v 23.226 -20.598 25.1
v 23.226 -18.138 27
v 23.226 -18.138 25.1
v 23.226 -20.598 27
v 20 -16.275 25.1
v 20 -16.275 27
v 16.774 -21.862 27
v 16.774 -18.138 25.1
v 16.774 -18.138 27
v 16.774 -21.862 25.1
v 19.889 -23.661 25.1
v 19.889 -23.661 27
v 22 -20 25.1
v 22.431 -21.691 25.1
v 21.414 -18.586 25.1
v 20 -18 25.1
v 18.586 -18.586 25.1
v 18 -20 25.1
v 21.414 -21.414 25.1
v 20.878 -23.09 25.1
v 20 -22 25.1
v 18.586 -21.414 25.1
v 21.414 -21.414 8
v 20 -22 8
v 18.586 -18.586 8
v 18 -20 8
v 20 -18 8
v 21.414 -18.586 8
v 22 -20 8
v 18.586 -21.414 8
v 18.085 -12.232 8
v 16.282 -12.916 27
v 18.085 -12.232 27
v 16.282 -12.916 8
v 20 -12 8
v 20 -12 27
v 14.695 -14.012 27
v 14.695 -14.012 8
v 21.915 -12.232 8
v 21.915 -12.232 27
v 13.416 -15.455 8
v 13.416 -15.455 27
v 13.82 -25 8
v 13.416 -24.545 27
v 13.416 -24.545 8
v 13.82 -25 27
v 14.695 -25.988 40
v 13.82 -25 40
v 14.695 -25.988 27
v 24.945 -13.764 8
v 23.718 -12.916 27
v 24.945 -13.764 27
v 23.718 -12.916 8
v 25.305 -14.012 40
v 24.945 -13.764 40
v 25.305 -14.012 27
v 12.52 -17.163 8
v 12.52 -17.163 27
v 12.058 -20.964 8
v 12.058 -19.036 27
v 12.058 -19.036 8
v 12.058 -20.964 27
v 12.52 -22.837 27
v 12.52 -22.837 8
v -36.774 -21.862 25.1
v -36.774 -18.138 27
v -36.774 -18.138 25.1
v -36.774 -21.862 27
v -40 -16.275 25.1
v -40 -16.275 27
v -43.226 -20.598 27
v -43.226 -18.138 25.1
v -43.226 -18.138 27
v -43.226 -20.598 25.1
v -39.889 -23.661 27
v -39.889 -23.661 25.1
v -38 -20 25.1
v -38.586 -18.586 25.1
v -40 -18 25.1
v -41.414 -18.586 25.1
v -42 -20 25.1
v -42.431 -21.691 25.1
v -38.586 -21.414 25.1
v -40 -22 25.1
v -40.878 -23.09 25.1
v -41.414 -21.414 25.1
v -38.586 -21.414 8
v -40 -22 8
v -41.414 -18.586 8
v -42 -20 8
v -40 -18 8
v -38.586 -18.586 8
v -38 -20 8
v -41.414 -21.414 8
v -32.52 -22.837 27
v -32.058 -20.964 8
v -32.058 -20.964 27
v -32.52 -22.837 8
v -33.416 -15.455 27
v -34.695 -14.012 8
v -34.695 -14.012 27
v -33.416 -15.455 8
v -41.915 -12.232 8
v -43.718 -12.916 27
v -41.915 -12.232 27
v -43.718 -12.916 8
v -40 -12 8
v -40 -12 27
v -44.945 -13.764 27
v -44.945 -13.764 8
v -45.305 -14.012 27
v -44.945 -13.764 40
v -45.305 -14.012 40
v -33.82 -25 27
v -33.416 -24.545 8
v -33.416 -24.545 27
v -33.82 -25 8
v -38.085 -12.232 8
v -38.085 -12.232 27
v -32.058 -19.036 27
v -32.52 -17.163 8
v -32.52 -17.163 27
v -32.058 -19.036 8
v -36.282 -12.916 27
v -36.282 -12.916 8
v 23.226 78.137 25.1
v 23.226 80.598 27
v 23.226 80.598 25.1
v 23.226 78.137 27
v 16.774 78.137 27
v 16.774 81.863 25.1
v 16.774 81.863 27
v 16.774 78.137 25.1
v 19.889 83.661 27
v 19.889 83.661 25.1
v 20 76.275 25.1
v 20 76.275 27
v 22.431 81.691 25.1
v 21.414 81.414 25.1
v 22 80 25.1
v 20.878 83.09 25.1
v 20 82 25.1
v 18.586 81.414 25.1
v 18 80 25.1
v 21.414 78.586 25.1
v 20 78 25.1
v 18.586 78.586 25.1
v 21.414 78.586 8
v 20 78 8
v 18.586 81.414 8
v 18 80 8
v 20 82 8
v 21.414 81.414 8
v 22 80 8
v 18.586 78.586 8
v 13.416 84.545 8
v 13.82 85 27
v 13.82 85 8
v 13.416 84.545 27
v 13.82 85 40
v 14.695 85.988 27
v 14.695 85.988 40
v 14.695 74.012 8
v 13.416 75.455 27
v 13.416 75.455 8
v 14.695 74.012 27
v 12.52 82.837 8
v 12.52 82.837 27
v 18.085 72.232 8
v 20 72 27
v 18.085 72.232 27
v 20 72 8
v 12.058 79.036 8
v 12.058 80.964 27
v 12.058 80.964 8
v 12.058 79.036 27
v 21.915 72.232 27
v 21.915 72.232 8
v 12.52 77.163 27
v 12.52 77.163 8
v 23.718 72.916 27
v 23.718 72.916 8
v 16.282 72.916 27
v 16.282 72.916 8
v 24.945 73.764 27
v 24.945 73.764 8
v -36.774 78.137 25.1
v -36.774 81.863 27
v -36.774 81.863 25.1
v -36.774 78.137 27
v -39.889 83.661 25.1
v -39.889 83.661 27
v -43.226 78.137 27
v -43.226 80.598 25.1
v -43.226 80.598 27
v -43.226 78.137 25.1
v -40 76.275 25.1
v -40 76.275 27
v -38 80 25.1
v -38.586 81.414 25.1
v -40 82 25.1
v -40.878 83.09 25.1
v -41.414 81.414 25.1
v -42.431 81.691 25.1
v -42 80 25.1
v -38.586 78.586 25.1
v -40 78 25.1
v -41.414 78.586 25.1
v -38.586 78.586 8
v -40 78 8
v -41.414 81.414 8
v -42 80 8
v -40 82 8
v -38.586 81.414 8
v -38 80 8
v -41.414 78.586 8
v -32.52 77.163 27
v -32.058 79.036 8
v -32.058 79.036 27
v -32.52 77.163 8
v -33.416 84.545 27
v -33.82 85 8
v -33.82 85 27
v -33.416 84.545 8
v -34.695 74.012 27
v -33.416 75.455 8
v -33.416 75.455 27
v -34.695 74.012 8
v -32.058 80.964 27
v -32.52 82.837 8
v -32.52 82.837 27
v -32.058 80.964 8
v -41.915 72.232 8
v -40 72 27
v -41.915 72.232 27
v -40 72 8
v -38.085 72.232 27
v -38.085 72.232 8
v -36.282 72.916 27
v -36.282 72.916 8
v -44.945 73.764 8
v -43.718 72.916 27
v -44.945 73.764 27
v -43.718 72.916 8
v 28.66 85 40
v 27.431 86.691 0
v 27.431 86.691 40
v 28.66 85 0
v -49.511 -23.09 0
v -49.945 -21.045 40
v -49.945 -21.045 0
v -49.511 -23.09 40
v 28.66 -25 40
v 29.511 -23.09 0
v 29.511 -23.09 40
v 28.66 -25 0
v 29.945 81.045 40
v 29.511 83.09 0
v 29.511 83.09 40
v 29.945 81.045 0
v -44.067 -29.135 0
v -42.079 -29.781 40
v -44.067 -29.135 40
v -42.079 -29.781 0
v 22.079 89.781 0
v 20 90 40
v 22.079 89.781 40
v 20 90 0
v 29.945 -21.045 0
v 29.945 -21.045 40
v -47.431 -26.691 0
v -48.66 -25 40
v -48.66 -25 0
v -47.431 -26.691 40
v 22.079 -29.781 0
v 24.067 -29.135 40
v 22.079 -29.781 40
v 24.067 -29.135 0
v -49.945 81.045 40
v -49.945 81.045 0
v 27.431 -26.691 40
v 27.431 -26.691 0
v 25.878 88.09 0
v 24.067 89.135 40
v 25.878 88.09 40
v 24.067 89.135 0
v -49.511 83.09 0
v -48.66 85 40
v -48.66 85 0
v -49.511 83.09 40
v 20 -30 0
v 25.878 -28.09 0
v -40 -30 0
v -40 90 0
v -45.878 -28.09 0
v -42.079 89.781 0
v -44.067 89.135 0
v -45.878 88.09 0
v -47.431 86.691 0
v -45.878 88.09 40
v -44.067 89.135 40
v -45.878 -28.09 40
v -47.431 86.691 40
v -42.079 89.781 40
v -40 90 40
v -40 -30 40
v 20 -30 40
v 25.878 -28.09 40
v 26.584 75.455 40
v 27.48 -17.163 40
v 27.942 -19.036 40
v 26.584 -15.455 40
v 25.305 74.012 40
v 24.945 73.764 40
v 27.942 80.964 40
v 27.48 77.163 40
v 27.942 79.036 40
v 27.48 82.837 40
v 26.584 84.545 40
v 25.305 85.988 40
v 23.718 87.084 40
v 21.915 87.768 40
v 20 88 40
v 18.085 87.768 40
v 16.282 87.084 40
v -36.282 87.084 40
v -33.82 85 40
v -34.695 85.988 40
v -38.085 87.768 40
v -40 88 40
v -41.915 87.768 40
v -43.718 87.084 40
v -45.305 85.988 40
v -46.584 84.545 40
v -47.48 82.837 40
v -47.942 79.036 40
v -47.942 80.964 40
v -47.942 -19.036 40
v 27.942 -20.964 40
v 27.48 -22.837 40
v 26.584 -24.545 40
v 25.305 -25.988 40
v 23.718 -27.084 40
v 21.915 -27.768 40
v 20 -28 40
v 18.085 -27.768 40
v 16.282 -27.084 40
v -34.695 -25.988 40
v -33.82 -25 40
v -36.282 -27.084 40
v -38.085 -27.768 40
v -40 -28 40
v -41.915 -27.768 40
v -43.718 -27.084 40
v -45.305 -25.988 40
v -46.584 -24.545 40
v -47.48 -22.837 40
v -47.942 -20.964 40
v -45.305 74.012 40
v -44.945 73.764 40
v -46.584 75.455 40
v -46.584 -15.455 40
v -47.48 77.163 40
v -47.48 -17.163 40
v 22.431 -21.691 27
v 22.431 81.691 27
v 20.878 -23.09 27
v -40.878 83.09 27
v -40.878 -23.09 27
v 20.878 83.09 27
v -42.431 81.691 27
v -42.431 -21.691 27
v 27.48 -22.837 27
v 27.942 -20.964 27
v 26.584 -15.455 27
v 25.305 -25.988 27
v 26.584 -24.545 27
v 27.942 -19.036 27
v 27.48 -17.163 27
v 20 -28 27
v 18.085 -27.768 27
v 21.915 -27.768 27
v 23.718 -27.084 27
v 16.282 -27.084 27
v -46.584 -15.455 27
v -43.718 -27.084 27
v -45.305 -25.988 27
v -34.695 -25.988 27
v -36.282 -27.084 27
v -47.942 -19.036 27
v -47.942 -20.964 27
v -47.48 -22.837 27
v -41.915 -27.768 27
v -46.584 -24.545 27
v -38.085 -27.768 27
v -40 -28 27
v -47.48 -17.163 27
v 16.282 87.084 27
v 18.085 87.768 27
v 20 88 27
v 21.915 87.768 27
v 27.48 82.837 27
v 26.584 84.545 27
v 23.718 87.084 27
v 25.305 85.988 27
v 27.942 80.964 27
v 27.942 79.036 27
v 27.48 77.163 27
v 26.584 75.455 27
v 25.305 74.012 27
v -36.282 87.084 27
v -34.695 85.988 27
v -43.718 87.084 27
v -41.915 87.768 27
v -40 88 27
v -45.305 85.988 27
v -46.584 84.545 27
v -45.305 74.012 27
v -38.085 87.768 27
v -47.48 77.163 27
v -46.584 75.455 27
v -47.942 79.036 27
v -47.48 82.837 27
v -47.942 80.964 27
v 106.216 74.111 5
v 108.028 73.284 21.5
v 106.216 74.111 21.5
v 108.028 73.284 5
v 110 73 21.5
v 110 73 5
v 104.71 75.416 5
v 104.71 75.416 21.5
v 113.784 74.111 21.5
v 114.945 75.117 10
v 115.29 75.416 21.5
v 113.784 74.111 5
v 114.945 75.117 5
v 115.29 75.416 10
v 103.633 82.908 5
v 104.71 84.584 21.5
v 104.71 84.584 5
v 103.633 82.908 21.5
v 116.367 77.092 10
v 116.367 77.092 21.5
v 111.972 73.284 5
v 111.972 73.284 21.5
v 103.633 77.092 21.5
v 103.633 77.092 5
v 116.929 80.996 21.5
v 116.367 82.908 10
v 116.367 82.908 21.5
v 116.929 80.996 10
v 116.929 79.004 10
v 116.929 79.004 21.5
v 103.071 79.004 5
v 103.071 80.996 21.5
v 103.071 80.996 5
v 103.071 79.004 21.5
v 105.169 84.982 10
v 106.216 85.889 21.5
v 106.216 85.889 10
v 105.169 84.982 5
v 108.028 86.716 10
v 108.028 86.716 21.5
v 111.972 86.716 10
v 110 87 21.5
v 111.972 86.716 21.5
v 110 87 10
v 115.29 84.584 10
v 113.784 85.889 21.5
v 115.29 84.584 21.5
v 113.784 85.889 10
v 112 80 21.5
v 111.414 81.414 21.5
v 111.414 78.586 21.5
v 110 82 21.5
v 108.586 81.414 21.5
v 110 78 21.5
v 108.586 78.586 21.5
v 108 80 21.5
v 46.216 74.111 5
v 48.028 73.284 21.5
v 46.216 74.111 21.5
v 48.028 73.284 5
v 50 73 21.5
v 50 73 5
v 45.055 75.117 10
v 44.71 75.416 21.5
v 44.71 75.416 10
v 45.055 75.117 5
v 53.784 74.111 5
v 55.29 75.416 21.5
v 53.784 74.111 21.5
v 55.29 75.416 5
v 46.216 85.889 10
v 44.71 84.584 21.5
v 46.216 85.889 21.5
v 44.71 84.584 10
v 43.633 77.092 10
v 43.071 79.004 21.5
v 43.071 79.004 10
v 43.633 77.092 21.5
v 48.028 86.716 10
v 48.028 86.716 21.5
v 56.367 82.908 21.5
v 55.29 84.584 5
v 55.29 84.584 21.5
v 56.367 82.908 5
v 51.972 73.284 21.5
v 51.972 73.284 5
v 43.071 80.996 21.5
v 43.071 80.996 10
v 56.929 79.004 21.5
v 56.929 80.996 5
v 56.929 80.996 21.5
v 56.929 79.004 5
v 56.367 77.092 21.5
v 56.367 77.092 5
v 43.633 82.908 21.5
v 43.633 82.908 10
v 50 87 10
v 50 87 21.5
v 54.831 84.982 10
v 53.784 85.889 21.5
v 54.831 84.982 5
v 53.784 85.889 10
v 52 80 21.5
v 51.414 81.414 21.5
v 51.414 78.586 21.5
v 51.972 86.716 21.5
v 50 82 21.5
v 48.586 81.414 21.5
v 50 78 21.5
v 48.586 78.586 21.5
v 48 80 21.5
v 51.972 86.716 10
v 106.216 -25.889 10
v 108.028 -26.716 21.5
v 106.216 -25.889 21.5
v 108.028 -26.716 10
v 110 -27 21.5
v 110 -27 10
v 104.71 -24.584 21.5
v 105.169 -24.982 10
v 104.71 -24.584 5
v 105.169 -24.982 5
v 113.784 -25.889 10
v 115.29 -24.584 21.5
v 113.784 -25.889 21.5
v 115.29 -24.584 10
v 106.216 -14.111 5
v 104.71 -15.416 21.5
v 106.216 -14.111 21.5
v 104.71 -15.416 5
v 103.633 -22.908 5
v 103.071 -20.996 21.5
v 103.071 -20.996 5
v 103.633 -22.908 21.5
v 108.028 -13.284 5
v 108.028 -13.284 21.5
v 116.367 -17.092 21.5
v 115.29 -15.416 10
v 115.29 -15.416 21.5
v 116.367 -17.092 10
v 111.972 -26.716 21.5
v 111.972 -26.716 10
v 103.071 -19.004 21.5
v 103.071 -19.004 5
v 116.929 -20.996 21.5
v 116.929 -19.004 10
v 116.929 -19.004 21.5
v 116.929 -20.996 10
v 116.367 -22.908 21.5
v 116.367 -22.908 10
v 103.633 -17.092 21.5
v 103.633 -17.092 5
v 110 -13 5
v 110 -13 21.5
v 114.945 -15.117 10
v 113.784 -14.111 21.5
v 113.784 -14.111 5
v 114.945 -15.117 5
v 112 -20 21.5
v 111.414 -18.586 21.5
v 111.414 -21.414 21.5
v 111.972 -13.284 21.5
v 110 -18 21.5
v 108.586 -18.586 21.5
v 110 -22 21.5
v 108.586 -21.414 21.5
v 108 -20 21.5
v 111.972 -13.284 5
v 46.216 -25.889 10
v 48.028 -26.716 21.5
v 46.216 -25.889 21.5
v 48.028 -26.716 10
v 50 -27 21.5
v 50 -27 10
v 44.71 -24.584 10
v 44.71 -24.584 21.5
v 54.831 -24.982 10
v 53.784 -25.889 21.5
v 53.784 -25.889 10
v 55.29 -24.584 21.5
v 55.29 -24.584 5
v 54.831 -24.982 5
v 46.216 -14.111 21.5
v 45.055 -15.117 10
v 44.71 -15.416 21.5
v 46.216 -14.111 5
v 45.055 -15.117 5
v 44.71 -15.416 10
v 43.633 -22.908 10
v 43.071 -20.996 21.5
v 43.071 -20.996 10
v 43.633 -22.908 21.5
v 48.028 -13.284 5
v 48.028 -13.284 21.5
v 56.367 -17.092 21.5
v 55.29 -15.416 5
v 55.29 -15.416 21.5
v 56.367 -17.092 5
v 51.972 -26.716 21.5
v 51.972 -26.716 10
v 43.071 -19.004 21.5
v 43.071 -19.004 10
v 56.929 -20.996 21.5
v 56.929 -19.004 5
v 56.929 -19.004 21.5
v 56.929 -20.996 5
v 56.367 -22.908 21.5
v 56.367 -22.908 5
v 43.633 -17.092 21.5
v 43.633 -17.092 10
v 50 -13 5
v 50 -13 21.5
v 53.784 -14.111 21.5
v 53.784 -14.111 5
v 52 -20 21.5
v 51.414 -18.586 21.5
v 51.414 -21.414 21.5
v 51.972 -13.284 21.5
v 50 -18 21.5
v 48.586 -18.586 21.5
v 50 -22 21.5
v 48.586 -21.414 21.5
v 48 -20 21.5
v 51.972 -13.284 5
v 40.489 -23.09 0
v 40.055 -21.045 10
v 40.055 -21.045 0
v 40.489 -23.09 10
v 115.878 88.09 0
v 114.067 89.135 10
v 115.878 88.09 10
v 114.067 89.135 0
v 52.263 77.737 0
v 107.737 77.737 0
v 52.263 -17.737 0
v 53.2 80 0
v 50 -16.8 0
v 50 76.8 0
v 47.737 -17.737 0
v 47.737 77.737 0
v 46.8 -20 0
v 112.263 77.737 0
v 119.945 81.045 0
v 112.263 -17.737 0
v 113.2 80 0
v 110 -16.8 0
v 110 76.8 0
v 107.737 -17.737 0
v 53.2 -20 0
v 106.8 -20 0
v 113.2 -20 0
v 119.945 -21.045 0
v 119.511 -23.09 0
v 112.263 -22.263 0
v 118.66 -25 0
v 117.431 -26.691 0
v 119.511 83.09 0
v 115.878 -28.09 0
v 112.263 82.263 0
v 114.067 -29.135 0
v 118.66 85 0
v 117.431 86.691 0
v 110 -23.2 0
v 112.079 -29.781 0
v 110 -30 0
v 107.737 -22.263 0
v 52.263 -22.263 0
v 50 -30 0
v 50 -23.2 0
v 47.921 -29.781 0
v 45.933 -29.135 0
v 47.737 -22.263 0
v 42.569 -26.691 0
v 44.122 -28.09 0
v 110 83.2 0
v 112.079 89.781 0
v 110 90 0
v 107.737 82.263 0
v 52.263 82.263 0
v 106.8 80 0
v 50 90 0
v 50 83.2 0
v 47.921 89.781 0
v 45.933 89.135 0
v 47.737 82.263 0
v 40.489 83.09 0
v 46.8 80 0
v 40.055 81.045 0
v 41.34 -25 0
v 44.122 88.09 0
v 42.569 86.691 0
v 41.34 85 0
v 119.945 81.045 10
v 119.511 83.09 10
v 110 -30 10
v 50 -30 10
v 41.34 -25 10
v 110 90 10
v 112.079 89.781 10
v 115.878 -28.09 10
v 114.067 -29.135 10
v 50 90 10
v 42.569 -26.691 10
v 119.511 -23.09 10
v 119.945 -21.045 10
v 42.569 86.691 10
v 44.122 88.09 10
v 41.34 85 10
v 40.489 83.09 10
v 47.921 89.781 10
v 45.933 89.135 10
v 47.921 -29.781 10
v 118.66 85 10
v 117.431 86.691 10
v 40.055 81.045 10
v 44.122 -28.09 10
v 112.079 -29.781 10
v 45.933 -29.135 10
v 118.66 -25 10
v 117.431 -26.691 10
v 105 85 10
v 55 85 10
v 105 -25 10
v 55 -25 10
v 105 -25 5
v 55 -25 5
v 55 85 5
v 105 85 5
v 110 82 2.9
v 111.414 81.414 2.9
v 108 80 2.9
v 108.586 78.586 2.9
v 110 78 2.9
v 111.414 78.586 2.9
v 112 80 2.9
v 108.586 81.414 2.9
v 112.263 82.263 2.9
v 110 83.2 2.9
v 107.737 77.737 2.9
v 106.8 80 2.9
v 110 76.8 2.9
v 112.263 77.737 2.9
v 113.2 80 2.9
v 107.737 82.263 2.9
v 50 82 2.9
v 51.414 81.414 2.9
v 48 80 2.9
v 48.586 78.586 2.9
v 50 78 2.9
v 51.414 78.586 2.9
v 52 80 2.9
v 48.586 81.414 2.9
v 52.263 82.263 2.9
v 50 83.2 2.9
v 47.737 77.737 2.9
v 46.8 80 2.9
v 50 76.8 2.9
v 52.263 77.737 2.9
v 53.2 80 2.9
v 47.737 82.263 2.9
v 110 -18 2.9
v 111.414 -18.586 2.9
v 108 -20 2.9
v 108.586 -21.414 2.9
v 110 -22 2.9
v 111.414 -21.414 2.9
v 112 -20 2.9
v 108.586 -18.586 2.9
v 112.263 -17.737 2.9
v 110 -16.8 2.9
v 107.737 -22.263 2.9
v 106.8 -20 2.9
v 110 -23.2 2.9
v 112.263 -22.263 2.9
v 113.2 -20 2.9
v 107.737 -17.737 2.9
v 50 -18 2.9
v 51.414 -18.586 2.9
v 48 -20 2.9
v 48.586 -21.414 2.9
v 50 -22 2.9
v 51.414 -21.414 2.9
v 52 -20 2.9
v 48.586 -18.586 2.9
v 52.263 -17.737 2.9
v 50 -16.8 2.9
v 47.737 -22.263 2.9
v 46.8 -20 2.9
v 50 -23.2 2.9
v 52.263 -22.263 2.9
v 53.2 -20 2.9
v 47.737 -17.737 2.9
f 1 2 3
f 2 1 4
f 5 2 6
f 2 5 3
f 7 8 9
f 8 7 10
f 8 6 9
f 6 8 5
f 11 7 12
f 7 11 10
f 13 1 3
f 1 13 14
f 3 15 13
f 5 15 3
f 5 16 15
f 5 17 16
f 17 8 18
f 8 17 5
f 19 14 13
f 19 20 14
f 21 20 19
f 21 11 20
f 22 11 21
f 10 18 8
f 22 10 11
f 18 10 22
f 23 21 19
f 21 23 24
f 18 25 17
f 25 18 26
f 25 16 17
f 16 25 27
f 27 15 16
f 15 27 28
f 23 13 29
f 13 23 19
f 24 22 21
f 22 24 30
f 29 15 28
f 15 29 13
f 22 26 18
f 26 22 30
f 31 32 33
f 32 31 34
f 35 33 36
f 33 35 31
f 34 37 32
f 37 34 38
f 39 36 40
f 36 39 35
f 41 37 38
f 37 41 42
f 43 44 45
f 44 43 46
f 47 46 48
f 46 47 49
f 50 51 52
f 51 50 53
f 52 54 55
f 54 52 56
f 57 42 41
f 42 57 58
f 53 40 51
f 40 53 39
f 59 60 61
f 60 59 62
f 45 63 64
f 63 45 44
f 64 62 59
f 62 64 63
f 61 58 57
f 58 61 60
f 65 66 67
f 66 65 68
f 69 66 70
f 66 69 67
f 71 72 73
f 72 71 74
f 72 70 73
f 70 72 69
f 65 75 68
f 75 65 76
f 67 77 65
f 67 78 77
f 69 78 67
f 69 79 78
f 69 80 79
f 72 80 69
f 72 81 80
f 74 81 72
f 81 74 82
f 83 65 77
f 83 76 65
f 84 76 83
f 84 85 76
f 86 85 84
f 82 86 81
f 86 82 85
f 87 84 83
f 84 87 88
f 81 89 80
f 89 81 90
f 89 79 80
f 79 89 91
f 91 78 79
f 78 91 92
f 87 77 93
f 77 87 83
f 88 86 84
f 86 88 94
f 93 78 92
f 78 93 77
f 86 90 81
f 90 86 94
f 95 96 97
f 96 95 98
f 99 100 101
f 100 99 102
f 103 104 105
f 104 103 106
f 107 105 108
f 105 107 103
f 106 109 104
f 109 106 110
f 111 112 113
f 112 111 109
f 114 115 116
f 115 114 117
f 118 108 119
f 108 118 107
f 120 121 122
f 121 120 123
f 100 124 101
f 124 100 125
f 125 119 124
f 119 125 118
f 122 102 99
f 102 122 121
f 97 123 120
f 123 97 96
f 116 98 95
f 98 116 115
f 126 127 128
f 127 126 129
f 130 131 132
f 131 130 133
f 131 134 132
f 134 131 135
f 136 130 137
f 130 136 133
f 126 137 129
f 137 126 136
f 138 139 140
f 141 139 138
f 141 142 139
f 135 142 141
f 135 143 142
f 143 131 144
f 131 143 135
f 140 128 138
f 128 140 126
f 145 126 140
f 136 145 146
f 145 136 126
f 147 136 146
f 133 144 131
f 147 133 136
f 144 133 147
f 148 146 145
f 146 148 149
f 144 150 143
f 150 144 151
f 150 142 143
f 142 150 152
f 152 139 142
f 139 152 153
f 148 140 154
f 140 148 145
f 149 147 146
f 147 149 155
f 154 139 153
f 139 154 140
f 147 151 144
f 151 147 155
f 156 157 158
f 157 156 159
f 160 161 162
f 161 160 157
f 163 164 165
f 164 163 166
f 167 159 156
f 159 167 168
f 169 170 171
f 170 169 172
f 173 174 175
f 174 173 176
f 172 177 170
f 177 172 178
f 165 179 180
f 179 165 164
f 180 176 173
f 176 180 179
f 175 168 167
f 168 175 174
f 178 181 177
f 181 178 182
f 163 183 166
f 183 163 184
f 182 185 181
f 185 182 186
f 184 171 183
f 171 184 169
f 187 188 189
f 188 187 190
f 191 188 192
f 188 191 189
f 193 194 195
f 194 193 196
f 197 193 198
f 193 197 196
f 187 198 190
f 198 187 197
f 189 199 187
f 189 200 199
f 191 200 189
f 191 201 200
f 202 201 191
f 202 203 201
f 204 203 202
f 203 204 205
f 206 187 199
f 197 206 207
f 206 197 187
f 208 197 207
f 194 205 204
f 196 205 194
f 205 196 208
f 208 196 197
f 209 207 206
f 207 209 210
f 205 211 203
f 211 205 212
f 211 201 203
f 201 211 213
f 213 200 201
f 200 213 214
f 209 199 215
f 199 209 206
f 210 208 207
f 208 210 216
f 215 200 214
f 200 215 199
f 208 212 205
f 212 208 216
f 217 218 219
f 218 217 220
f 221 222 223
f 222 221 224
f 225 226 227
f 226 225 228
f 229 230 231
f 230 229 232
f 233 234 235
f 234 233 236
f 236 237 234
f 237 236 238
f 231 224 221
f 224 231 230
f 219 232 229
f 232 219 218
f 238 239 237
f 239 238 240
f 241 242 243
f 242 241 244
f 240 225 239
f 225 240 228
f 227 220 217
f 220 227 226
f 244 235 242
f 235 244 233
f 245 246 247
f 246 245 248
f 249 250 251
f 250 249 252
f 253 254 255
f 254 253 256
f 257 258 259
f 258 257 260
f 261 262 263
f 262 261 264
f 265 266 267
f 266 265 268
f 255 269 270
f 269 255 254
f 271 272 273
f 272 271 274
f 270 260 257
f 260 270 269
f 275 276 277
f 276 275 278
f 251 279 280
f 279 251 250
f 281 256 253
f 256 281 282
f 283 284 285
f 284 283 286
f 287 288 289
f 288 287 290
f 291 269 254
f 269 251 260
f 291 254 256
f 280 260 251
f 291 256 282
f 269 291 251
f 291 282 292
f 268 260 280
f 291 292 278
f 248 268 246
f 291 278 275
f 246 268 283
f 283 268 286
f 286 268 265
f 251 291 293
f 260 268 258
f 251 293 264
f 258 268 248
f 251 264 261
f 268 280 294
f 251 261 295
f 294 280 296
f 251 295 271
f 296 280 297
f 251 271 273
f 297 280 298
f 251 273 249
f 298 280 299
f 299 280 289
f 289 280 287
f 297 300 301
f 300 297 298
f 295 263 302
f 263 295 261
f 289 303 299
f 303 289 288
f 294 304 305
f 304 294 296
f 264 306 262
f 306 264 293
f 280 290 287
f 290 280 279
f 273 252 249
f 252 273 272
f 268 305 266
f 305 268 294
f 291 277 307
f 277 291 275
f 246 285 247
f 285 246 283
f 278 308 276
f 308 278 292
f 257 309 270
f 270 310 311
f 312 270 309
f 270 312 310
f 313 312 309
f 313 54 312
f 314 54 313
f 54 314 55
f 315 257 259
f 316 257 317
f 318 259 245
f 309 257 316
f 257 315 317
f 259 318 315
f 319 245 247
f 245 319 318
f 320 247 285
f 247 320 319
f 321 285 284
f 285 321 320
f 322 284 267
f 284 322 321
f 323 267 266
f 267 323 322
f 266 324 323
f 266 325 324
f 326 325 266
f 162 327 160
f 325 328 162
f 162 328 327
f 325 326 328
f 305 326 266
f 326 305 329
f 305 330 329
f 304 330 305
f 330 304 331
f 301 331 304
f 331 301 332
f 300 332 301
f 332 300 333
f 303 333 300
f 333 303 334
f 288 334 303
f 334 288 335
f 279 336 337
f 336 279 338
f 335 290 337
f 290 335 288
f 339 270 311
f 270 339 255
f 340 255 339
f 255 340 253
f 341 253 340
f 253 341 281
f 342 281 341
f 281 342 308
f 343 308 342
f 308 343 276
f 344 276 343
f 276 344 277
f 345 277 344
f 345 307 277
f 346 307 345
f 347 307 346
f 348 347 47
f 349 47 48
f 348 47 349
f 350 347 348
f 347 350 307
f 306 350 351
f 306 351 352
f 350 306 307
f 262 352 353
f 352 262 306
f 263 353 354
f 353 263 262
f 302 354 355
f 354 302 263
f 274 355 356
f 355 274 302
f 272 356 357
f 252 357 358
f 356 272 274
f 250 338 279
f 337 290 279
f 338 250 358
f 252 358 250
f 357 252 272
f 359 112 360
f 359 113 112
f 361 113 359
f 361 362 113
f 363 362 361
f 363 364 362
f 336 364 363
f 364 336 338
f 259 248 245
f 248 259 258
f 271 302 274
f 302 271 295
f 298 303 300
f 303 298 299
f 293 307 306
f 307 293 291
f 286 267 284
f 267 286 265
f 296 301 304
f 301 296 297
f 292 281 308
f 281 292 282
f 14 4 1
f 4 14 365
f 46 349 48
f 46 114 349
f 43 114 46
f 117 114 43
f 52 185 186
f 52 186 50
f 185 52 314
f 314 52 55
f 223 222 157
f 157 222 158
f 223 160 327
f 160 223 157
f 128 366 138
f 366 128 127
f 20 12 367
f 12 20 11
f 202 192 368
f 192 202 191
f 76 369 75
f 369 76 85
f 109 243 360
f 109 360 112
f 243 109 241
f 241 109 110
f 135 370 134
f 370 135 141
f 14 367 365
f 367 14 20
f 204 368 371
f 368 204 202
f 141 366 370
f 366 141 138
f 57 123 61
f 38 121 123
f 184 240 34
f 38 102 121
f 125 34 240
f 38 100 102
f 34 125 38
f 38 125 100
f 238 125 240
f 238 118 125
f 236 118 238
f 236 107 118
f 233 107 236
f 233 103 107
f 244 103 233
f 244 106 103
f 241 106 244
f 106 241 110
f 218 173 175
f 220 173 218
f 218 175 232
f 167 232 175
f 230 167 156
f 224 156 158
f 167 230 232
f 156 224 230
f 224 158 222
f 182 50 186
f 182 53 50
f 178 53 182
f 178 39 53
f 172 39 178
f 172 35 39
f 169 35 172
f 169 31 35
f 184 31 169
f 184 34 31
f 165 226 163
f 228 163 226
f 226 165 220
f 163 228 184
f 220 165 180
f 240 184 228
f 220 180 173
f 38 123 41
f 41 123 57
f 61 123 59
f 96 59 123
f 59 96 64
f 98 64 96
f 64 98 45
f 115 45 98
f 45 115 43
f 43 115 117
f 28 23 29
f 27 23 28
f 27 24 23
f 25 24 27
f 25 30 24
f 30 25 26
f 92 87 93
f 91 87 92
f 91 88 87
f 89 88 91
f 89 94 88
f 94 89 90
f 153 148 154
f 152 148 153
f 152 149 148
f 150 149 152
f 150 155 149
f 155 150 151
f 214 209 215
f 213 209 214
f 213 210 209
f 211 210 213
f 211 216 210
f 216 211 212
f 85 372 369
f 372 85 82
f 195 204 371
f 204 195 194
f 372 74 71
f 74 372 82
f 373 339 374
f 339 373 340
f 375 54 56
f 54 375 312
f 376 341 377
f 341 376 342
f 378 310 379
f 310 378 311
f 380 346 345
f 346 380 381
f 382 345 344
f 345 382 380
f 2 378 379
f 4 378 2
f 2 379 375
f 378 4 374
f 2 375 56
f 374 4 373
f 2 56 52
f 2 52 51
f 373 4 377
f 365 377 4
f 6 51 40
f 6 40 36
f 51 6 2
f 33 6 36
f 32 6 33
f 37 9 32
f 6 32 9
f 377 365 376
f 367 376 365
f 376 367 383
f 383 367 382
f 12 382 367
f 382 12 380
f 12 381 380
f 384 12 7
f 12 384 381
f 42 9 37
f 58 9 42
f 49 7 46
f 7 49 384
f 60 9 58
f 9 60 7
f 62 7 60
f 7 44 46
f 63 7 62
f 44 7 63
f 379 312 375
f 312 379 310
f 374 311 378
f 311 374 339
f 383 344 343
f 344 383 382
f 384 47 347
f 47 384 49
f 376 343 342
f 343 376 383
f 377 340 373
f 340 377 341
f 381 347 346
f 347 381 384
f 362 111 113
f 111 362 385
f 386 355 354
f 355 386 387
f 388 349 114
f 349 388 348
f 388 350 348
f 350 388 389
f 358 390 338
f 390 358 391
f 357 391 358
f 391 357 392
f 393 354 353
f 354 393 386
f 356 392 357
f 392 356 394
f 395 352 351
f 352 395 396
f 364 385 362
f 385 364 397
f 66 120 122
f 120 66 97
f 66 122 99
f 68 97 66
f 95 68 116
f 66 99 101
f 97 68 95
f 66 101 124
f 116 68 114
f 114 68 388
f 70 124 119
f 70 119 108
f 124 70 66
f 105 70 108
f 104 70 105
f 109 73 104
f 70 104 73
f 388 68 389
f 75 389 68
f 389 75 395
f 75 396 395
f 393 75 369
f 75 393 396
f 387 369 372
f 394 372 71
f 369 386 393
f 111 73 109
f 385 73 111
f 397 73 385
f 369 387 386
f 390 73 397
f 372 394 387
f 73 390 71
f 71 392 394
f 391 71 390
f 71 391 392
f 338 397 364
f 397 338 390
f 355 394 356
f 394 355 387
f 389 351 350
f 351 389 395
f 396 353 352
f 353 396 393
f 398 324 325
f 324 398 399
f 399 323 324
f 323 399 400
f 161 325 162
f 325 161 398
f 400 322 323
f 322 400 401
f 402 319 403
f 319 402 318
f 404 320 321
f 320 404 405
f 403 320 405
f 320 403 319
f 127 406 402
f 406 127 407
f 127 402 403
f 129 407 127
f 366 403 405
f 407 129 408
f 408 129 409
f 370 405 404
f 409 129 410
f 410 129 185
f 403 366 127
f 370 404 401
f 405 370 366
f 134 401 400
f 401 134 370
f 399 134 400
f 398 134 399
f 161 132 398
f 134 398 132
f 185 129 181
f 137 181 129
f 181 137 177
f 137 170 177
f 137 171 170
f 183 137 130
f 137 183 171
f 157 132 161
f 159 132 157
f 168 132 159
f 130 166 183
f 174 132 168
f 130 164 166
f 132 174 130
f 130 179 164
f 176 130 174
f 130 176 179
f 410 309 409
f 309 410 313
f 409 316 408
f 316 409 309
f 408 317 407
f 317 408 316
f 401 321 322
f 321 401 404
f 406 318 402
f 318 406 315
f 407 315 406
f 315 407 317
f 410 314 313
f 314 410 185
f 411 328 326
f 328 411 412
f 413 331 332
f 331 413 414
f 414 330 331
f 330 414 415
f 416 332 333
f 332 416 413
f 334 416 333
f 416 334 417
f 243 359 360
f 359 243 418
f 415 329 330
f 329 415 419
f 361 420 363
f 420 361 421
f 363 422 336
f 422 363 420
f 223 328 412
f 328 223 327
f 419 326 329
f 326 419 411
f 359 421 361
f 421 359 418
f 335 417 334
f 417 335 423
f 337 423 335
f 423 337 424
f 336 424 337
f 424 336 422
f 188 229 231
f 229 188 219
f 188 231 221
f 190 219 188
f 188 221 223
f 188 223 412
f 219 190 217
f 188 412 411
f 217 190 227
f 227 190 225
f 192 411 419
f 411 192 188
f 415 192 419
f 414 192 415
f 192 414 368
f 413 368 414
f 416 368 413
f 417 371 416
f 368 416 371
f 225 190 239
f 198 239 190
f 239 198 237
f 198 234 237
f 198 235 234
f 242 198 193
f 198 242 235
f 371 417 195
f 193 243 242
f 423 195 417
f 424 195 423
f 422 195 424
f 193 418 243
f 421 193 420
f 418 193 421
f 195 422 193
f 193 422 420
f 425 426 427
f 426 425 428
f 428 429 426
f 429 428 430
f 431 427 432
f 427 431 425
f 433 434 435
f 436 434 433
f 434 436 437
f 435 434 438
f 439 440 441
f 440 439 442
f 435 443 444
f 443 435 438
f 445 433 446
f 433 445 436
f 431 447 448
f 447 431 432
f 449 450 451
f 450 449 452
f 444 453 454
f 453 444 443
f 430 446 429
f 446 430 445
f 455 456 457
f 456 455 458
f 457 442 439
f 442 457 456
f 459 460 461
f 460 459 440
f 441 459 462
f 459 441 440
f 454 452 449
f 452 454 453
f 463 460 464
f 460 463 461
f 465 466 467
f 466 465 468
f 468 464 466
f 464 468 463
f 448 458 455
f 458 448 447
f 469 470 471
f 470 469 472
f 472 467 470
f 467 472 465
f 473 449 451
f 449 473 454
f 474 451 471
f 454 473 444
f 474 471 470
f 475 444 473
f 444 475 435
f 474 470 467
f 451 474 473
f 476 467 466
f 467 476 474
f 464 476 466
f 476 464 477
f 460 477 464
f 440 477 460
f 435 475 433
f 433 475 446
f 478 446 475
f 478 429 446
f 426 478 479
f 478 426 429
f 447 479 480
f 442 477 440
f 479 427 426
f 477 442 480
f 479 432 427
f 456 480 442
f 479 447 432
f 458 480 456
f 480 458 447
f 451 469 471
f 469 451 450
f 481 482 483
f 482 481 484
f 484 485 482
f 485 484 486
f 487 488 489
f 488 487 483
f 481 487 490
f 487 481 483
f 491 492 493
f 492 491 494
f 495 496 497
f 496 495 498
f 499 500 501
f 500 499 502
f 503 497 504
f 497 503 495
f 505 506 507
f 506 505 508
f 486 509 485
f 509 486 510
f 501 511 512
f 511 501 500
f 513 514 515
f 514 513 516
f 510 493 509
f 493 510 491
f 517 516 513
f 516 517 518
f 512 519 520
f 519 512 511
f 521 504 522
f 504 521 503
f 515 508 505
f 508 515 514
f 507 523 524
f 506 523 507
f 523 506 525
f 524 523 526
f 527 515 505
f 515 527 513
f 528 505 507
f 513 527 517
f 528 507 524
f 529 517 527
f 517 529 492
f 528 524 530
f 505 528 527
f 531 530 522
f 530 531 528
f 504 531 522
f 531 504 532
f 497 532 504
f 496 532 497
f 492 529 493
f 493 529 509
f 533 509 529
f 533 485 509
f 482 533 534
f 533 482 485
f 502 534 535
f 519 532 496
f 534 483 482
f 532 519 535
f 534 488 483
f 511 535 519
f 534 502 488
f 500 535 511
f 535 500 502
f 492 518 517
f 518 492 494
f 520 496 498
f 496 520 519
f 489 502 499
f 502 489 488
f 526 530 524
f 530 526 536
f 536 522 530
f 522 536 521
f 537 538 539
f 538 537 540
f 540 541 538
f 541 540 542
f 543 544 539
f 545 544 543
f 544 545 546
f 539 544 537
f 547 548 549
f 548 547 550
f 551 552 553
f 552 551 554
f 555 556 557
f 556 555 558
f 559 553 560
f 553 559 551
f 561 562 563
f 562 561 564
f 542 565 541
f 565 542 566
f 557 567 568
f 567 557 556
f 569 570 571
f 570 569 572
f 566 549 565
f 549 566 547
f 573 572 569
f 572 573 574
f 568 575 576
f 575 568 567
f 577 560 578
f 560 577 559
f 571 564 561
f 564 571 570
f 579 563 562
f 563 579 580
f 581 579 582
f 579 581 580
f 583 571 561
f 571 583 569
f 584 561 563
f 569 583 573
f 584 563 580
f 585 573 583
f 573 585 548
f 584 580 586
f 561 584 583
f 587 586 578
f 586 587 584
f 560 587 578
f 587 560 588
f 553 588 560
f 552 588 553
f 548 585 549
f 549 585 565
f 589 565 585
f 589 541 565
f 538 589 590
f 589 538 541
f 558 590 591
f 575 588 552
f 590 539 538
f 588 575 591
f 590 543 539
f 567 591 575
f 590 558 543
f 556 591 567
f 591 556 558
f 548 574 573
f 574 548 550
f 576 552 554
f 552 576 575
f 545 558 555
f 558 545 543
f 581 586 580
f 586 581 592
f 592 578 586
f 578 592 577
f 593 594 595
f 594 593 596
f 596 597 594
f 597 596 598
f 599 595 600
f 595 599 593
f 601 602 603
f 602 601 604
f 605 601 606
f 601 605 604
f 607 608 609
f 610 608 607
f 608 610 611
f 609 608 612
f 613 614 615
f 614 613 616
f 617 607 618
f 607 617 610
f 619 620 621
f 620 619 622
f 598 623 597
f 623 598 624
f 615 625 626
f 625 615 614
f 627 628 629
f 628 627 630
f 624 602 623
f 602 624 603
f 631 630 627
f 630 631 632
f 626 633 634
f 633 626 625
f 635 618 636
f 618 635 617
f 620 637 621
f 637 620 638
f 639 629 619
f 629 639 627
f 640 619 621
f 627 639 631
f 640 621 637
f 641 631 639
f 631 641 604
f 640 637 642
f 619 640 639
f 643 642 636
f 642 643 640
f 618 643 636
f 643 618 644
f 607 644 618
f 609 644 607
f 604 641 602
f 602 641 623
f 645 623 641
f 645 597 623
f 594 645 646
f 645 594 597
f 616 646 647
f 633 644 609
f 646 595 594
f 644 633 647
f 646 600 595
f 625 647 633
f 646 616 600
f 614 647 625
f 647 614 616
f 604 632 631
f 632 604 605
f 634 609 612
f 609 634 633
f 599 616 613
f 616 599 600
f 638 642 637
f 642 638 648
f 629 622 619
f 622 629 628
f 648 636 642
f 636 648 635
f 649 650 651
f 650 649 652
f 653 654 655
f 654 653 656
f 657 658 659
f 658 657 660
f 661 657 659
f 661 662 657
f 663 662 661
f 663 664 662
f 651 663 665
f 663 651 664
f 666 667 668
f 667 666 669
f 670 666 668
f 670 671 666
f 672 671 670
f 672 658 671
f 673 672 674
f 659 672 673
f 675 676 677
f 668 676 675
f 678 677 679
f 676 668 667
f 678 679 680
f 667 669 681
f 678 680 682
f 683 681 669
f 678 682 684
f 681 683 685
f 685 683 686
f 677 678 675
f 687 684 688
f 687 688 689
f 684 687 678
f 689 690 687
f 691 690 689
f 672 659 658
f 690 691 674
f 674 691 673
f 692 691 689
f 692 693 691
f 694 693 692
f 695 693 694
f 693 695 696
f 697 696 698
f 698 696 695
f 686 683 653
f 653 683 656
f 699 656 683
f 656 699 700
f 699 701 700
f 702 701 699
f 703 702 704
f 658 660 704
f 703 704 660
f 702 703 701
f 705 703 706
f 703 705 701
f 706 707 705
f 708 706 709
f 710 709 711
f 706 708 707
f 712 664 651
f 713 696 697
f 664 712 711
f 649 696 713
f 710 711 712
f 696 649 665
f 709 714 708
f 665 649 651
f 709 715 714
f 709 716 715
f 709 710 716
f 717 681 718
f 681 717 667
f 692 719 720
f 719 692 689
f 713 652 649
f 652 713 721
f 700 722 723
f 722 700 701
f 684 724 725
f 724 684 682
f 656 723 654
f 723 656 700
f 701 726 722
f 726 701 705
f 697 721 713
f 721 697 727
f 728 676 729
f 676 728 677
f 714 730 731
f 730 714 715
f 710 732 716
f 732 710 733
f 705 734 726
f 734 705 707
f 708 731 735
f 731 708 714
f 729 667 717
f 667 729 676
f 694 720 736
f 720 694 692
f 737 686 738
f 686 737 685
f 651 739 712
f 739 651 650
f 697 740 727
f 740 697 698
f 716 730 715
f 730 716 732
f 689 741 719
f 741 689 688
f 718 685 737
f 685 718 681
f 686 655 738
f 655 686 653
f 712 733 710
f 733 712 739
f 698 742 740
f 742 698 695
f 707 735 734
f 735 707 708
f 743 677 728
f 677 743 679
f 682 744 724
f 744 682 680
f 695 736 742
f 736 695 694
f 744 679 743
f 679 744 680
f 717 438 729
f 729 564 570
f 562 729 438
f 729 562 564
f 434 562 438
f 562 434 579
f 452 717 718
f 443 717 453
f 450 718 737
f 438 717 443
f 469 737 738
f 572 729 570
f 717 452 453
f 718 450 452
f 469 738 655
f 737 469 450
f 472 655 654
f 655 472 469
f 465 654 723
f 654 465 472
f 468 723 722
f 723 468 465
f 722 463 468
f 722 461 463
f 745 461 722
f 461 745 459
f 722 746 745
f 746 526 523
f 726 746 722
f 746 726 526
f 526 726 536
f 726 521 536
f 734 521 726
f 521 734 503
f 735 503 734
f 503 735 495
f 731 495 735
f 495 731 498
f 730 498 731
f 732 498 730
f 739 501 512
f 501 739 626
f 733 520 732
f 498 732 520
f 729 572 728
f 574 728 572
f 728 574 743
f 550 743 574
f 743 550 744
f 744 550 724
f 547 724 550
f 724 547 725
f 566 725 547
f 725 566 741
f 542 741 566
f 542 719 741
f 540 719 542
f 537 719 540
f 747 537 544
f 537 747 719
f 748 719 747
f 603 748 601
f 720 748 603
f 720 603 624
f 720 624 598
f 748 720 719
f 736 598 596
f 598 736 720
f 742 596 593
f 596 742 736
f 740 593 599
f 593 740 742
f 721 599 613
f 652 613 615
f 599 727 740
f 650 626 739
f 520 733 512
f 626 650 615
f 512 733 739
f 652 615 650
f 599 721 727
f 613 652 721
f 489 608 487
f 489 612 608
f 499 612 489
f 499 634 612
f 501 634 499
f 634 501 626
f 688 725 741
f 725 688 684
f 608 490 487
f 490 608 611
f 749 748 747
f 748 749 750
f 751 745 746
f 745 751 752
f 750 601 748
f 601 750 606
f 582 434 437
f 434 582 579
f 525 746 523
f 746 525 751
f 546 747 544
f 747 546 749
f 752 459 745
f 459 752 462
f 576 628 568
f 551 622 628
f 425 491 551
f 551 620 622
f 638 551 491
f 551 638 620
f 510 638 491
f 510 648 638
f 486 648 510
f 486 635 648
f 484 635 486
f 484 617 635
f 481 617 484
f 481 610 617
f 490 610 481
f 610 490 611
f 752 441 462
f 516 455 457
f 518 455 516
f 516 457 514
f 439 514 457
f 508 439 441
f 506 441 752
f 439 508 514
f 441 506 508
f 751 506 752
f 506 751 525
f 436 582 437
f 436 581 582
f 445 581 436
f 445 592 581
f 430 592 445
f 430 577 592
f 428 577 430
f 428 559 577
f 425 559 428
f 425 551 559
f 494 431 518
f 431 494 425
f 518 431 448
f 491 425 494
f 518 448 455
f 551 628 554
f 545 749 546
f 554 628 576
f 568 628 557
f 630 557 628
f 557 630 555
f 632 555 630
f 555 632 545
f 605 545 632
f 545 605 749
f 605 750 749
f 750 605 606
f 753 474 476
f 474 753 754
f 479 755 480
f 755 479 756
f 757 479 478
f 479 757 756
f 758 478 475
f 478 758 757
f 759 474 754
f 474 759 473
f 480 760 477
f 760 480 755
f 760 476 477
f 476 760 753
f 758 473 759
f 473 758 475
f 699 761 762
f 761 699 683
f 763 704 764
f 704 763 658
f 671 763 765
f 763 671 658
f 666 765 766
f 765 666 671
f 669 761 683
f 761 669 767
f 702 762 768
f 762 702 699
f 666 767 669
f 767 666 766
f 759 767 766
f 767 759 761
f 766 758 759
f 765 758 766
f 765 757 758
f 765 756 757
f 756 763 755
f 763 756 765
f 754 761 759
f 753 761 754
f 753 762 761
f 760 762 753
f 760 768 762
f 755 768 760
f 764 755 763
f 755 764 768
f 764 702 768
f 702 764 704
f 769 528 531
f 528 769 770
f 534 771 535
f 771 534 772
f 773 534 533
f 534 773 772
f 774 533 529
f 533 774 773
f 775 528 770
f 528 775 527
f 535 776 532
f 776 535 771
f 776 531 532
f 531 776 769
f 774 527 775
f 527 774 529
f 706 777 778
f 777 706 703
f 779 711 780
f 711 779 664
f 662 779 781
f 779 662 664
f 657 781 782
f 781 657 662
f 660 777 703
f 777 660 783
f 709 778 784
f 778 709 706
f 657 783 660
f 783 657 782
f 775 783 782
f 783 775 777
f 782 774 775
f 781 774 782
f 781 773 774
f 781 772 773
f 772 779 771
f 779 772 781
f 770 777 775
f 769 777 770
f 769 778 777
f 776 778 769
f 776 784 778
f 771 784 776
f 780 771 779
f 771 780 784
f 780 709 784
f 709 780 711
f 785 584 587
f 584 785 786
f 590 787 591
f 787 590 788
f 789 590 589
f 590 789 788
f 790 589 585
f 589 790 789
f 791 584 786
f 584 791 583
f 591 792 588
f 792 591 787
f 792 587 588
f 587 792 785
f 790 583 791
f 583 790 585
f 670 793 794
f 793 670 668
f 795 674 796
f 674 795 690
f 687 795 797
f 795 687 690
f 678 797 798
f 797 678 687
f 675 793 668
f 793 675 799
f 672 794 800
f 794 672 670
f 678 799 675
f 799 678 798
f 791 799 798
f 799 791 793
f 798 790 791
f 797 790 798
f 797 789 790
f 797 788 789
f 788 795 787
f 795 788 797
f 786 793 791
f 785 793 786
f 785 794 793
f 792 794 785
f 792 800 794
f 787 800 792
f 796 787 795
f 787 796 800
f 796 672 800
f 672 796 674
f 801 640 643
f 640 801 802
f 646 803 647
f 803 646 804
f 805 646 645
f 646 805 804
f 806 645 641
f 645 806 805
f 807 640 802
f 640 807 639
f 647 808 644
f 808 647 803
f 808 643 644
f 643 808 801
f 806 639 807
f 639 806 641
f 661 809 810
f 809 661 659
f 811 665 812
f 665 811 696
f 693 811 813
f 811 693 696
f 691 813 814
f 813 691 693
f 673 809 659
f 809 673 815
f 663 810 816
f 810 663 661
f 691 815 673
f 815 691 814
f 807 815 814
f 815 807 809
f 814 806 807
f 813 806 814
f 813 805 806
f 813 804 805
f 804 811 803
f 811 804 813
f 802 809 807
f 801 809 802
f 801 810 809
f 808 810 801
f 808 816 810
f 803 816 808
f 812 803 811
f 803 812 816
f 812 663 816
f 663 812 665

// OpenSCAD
separation=35;
n_faces=8;

box_x=100; 		//default = 100
box_y=60;  		//default = 60
box_z=40;  		//default = 40

lid_z=10; 		//default = 10
lid_tol=1; 		//tolerance

box_wall=5; 	//default = 5

pillar_z=25;	//default = 25
pillar_r=8;		//default = 8

3Dprintflag=1;
basebox_tr = 3Dprintflag ? [0,0,0] : [0,0,0];
basebox_rot = 3Dprintflag ? [0,0,90] : [0,0,0];

// lid_tr = 3Dprintflag ? [box_x*1.5,box_y,box_wall*2] : [-20,-20,40];
lid_tr = 3Dprintflag ? [110,box_y+20,box_wall*2] : [-20,-20,40];
lid_rot = 3Dprintflag ? [0,180,90] : [0,0,0];

battery_tr = 3Dprintflag ? [-50,10,0] : [0,0,0];
battery_rot = 3Dprintflag ? [90,0,1800] : [0,0,0];



// Box
translate(basebox_tr){rotate(basebox_rot){base_box();}}

// Lid
translate(lid_tr){rotate(lid_rot){lid();}}

// 9V battery
// translate(battery_tr){rotate(battery_rot){battery_9V();}}

module battery_9V() {
	cube(size=[26, 16.9, 44.7], center=true);
	translate([-6.5, 0, 2]){cylinder(r=8/2, h=48.8, center=true);}
	translate([13-6.5, 0, 2]){cylinder(r=8/2, h=48.8, center=true);}
}



module base_box() {
	difference() {
		base_box_rim();
		union() {
			translate([-20, -20, pillar_z+9.9]) {lid_pillars2();}
		}
	}
}

module lid() {
	difference() {
		union(){
				lid_rim();
				lid_pillars();
			}
			lid_screws();
	}
	// #lid_screws();
}

module lid_pillars() {
	//Pillars for screws
	union() {
		for (i=[0:1]) {
			for (j=[0:1]) {
				translate([box_x*i, box_y*j, -2]) {
						cylinder(r=pillar_r-lid_tol, h=box_wall+box_z-pillar_z-lid_tol, center=true);
				}
			}
		}
	}
}

module lid_pillars2() {
	//Pillars for base box without tolerance modification
	union() {
		for (i=[0:1]) {
			for (j=[0:1]) {
				translate([box_x*i, box_y*j, -.4]) {
						cylinder(r=pillar_r, h=box_z-pillar_z, center=true);
				}
			}
		}
	}
}

module lid_screws(){
	union() {
		for (i=[0:1]) {
			for (j=[0:1]) {
				translate([box_x*i, box_y*j, 10.1]) {
						screw();
				}
			}
		}
	}
}

module lid_rim(){
	lid_pillars();
	
	 difference() {
		//Outer shell
		hull() {
			translate([0, 0, 5]) {
				for (i=[0:1]) {
					for (j=[0:1]) {
						translate([box_x*i, box_y*j, 0]) {
							cylinder(r=10, h=lid_z, center=true);
						}
					}
				}
			}
		}
		//Inner shell	
		hull() {
				translate([box_wall,box_wall,0]) {
					cylinder(r=10, h=lid_z, center=true);}
				translate([box_x-box_wall,box_wall,0]) {
					cylinder(r=10, h=lid_z, center=true);}
				translate([box_wall,box_y-box_wall,0]) {
					cylinder(r=10, h=lid_z, center=true);}
				translate([box_x-box_wall,box_y-box_wall,0]) {
					cylinder(r=10, h=lid_z, center=true);}
			}
	}
}


module base_box_rim(){
	//Pillars for screws
	translate([-20, -20, 15]) {
		for (i=[0:1]) {
			for (j=[0:1]) {
				translate([box_x*i, box_y*j, 0]) {
					difference(){
						cylinder(r=pillar_r, h=pillar_z, center=true);
						union() {
							translate([0, 0, pillar_z-9.9]) {nut();}
							translate([0, 0, -10]) {cylinder(r=1.5+.5, h=27.80,$fn=n_faces);}
						}
					}
				}
			}
		}
	}
	
	
	difference() {
		//Outer shell
		hull() {
			translate([-20, -20, 20]) {
				for (i=[0:1]) {
					for (j=[0:1]) {
						translate([box_x*i, box_y*j, 0]) {
							cylinder(r=10, h=box_z, center=true);
						}
					}
				}
			}
		}
		//Inner shell	
		hull() {
			translate([-20, -20, 28]) {
				translate([box_wall,box_wall,0]) {
					cylinder(r=10, h=box_z, center=true);}
				translate([box_x-box_wall,box_wall,0]) {
					cylinder(r=10, h=box_z, center=true);}
				translate([box_wall,box_y-box_wall,0]) {
					cylinder(r=10, h=box_z, center=true);}
				translate([box_x-box_wall,box_y-box_wall,0]) {
					cylinder(r=10, h=box_z, center=true);}
			}
		}
	}
}

module base_box_holes(){
	box_holes_r=10;
	// Holes
	translate([0,0,5]) {cylinder(r=box_holes_r, h=20, center=true);}
	translate([(1.5*separation),0,5]) {cylinder(r=box_holes_r, h=40, center=true);}
}

module neck_attachment() {
	for (i=[0:1]) {
		scale([1.5, 1.5, 1.5]) {
			translate([separation*i, 0 , 0]) {
				difference() {
					modularHoseSegment(i4);
					// translate([0, 0 , 17]) {cube(size=[0, 0, 0], center=true);}
					translate([0, 0 , 17]) {cube(size=[15, 15, 10], center=true);}
				}
			}
		}
	}
}

module screw() {
	mirror([0,0,1]) {
		union() {
			cylinder(r=1.5+.5, h=27.80,$fn=n_faces);
			cylinder(r=5.4/2+.5, h=3.00,$fn=n_faces);
		}
	}
}
module nut() {
	//nut_h=3; //Real
	nut_h=5; //Making Hole deeper
	translate([0, 0, -nut_h]) {
		cylinder(r=5.45/2+1, h=nut_h,$fn=6);
	}	
}
	
module screw2(nutz) {
	mirror([0,0,1]) {
		union() {
			cylinder(r=1.5+.5, h=27.80,$fn=n_faces);
			cylinder(r=5.4/2+.5, h=3.00,$fn=n_faces);
		}
		translate([0, 0, nutz]) {nut();}
	}
}
	

	
